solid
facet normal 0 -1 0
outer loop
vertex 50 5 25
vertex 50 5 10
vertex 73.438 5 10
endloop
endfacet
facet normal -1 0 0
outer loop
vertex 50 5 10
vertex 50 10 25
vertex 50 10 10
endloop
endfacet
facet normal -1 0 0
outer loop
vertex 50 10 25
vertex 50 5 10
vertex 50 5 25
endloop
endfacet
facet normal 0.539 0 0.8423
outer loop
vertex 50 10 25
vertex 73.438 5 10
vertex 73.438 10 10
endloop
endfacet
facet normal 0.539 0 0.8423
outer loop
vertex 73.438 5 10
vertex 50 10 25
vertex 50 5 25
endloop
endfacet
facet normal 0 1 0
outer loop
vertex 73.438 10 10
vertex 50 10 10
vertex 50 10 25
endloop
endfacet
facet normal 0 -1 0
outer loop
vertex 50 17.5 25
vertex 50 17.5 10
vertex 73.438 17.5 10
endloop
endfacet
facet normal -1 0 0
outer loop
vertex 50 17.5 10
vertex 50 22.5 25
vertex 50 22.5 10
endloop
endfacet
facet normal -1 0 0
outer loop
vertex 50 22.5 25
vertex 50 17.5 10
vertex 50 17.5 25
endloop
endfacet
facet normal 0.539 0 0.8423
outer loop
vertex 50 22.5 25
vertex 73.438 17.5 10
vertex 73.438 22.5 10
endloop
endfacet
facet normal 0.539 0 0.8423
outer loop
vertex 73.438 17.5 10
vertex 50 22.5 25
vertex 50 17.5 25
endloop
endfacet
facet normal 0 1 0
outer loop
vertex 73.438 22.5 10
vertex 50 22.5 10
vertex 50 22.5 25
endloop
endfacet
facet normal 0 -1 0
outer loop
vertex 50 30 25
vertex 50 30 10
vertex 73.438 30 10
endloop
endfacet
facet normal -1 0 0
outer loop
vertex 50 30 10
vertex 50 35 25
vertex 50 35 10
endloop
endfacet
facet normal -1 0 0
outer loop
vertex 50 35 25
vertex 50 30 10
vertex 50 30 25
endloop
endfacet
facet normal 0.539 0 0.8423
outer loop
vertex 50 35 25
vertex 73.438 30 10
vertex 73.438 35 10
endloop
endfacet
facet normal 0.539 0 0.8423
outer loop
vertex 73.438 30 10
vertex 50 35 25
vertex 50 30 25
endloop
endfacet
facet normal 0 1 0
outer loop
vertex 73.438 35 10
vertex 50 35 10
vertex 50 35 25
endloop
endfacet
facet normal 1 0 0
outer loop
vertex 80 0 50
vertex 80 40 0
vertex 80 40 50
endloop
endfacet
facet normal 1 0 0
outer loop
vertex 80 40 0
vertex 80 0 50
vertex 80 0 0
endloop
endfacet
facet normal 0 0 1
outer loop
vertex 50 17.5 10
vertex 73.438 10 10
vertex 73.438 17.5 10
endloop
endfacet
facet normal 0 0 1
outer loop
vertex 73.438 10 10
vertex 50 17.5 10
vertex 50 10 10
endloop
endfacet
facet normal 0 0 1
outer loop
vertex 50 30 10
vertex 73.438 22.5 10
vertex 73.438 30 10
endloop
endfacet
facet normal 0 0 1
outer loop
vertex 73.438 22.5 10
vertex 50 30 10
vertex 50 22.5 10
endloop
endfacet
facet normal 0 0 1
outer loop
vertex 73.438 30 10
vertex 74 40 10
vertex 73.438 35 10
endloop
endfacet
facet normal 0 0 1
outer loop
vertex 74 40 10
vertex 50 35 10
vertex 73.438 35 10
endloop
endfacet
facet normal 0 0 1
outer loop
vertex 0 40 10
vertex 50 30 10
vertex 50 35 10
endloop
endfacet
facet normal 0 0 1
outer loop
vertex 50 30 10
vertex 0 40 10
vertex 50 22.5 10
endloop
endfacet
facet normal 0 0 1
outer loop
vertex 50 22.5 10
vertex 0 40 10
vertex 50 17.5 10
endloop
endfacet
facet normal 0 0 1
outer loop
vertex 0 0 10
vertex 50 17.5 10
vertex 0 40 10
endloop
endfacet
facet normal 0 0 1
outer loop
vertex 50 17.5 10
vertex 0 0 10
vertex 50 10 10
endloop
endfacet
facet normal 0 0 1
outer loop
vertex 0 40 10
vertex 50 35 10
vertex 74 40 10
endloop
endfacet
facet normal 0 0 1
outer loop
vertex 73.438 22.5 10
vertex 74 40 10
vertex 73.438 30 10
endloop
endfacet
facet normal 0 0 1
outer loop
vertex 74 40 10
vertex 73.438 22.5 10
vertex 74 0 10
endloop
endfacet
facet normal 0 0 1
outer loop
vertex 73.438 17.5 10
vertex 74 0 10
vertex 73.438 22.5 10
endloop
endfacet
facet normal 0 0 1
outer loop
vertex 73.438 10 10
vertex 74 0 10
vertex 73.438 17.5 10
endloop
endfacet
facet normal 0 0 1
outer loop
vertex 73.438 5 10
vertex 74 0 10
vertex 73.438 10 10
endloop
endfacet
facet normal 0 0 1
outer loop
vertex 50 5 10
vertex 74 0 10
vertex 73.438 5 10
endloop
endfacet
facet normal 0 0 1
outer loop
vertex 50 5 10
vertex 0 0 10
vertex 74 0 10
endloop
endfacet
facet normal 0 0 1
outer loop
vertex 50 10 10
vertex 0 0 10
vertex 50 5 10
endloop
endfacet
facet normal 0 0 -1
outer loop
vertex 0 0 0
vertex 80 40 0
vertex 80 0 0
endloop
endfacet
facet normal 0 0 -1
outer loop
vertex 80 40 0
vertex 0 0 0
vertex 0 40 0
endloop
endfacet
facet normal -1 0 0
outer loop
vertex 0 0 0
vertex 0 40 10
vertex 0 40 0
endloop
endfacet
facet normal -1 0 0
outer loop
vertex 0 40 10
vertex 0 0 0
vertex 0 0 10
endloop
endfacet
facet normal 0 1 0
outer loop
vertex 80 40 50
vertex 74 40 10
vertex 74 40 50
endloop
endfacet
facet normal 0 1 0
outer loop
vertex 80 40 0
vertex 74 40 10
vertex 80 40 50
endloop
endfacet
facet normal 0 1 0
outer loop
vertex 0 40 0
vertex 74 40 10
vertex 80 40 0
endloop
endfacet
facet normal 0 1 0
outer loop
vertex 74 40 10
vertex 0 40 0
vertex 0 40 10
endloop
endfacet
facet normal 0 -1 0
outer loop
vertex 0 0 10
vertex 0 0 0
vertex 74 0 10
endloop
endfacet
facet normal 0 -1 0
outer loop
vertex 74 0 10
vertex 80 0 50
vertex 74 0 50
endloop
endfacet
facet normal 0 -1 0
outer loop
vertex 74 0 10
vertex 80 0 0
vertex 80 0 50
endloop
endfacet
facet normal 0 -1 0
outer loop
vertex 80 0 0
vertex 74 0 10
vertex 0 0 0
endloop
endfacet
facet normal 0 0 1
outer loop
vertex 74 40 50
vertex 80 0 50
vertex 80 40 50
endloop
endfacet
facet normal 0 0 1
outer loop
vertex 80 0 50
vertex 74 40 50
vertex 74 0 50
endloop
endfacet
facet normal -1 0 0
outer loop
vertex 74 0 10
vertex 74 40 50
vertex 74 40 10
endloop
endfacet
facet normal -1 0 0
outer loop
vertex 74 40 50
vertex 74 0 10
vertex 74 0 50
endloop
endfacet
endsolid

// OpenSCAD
$fn = 32;

// ----------------------------------------------------------------------
// Rib bracket: 3-gusset L bracket
// ----------------------------------------------------------------------

// --- parameters (mm) ---
base_l = 80;              // foot length, X
base_w = 40;              // foot width, Y
base_t = 10;              // foot thickness
plate_t = 6;              // upright plate thickness
plate_h = 50;             // overall height
gus_l = 24;               // gusset leg along the foot
gus_h = 16;               // gusset height
gus_t = 5;                // gusset thickness
gus_edge = 5;             // gusset margin from the foot edge
n_gus = 3;                // gusset count

gus_pitch = (base_w - 2 * gus_edge - gus_t) / (n_gus - 1);  // gusset pitch

union() {
  cube([base_l, base_w, base_t]);
  translate([base_l - plate_t, 0, base_t - 1])
    cube([plate_t, base_w, plate_h - base_t + 1]);
  for (i = [0 : n_gus - 1])
    translate([base_l - plate_t - gus_l, gus_edge + i * gus_pitch, base_t - 1])
      rotate([-90, 0, 0])
        linear_extrude(height = gus_t)
          polygon(points = [[0, 0], [gus_l + 1, 0], [0, -gus_h]]);
}
